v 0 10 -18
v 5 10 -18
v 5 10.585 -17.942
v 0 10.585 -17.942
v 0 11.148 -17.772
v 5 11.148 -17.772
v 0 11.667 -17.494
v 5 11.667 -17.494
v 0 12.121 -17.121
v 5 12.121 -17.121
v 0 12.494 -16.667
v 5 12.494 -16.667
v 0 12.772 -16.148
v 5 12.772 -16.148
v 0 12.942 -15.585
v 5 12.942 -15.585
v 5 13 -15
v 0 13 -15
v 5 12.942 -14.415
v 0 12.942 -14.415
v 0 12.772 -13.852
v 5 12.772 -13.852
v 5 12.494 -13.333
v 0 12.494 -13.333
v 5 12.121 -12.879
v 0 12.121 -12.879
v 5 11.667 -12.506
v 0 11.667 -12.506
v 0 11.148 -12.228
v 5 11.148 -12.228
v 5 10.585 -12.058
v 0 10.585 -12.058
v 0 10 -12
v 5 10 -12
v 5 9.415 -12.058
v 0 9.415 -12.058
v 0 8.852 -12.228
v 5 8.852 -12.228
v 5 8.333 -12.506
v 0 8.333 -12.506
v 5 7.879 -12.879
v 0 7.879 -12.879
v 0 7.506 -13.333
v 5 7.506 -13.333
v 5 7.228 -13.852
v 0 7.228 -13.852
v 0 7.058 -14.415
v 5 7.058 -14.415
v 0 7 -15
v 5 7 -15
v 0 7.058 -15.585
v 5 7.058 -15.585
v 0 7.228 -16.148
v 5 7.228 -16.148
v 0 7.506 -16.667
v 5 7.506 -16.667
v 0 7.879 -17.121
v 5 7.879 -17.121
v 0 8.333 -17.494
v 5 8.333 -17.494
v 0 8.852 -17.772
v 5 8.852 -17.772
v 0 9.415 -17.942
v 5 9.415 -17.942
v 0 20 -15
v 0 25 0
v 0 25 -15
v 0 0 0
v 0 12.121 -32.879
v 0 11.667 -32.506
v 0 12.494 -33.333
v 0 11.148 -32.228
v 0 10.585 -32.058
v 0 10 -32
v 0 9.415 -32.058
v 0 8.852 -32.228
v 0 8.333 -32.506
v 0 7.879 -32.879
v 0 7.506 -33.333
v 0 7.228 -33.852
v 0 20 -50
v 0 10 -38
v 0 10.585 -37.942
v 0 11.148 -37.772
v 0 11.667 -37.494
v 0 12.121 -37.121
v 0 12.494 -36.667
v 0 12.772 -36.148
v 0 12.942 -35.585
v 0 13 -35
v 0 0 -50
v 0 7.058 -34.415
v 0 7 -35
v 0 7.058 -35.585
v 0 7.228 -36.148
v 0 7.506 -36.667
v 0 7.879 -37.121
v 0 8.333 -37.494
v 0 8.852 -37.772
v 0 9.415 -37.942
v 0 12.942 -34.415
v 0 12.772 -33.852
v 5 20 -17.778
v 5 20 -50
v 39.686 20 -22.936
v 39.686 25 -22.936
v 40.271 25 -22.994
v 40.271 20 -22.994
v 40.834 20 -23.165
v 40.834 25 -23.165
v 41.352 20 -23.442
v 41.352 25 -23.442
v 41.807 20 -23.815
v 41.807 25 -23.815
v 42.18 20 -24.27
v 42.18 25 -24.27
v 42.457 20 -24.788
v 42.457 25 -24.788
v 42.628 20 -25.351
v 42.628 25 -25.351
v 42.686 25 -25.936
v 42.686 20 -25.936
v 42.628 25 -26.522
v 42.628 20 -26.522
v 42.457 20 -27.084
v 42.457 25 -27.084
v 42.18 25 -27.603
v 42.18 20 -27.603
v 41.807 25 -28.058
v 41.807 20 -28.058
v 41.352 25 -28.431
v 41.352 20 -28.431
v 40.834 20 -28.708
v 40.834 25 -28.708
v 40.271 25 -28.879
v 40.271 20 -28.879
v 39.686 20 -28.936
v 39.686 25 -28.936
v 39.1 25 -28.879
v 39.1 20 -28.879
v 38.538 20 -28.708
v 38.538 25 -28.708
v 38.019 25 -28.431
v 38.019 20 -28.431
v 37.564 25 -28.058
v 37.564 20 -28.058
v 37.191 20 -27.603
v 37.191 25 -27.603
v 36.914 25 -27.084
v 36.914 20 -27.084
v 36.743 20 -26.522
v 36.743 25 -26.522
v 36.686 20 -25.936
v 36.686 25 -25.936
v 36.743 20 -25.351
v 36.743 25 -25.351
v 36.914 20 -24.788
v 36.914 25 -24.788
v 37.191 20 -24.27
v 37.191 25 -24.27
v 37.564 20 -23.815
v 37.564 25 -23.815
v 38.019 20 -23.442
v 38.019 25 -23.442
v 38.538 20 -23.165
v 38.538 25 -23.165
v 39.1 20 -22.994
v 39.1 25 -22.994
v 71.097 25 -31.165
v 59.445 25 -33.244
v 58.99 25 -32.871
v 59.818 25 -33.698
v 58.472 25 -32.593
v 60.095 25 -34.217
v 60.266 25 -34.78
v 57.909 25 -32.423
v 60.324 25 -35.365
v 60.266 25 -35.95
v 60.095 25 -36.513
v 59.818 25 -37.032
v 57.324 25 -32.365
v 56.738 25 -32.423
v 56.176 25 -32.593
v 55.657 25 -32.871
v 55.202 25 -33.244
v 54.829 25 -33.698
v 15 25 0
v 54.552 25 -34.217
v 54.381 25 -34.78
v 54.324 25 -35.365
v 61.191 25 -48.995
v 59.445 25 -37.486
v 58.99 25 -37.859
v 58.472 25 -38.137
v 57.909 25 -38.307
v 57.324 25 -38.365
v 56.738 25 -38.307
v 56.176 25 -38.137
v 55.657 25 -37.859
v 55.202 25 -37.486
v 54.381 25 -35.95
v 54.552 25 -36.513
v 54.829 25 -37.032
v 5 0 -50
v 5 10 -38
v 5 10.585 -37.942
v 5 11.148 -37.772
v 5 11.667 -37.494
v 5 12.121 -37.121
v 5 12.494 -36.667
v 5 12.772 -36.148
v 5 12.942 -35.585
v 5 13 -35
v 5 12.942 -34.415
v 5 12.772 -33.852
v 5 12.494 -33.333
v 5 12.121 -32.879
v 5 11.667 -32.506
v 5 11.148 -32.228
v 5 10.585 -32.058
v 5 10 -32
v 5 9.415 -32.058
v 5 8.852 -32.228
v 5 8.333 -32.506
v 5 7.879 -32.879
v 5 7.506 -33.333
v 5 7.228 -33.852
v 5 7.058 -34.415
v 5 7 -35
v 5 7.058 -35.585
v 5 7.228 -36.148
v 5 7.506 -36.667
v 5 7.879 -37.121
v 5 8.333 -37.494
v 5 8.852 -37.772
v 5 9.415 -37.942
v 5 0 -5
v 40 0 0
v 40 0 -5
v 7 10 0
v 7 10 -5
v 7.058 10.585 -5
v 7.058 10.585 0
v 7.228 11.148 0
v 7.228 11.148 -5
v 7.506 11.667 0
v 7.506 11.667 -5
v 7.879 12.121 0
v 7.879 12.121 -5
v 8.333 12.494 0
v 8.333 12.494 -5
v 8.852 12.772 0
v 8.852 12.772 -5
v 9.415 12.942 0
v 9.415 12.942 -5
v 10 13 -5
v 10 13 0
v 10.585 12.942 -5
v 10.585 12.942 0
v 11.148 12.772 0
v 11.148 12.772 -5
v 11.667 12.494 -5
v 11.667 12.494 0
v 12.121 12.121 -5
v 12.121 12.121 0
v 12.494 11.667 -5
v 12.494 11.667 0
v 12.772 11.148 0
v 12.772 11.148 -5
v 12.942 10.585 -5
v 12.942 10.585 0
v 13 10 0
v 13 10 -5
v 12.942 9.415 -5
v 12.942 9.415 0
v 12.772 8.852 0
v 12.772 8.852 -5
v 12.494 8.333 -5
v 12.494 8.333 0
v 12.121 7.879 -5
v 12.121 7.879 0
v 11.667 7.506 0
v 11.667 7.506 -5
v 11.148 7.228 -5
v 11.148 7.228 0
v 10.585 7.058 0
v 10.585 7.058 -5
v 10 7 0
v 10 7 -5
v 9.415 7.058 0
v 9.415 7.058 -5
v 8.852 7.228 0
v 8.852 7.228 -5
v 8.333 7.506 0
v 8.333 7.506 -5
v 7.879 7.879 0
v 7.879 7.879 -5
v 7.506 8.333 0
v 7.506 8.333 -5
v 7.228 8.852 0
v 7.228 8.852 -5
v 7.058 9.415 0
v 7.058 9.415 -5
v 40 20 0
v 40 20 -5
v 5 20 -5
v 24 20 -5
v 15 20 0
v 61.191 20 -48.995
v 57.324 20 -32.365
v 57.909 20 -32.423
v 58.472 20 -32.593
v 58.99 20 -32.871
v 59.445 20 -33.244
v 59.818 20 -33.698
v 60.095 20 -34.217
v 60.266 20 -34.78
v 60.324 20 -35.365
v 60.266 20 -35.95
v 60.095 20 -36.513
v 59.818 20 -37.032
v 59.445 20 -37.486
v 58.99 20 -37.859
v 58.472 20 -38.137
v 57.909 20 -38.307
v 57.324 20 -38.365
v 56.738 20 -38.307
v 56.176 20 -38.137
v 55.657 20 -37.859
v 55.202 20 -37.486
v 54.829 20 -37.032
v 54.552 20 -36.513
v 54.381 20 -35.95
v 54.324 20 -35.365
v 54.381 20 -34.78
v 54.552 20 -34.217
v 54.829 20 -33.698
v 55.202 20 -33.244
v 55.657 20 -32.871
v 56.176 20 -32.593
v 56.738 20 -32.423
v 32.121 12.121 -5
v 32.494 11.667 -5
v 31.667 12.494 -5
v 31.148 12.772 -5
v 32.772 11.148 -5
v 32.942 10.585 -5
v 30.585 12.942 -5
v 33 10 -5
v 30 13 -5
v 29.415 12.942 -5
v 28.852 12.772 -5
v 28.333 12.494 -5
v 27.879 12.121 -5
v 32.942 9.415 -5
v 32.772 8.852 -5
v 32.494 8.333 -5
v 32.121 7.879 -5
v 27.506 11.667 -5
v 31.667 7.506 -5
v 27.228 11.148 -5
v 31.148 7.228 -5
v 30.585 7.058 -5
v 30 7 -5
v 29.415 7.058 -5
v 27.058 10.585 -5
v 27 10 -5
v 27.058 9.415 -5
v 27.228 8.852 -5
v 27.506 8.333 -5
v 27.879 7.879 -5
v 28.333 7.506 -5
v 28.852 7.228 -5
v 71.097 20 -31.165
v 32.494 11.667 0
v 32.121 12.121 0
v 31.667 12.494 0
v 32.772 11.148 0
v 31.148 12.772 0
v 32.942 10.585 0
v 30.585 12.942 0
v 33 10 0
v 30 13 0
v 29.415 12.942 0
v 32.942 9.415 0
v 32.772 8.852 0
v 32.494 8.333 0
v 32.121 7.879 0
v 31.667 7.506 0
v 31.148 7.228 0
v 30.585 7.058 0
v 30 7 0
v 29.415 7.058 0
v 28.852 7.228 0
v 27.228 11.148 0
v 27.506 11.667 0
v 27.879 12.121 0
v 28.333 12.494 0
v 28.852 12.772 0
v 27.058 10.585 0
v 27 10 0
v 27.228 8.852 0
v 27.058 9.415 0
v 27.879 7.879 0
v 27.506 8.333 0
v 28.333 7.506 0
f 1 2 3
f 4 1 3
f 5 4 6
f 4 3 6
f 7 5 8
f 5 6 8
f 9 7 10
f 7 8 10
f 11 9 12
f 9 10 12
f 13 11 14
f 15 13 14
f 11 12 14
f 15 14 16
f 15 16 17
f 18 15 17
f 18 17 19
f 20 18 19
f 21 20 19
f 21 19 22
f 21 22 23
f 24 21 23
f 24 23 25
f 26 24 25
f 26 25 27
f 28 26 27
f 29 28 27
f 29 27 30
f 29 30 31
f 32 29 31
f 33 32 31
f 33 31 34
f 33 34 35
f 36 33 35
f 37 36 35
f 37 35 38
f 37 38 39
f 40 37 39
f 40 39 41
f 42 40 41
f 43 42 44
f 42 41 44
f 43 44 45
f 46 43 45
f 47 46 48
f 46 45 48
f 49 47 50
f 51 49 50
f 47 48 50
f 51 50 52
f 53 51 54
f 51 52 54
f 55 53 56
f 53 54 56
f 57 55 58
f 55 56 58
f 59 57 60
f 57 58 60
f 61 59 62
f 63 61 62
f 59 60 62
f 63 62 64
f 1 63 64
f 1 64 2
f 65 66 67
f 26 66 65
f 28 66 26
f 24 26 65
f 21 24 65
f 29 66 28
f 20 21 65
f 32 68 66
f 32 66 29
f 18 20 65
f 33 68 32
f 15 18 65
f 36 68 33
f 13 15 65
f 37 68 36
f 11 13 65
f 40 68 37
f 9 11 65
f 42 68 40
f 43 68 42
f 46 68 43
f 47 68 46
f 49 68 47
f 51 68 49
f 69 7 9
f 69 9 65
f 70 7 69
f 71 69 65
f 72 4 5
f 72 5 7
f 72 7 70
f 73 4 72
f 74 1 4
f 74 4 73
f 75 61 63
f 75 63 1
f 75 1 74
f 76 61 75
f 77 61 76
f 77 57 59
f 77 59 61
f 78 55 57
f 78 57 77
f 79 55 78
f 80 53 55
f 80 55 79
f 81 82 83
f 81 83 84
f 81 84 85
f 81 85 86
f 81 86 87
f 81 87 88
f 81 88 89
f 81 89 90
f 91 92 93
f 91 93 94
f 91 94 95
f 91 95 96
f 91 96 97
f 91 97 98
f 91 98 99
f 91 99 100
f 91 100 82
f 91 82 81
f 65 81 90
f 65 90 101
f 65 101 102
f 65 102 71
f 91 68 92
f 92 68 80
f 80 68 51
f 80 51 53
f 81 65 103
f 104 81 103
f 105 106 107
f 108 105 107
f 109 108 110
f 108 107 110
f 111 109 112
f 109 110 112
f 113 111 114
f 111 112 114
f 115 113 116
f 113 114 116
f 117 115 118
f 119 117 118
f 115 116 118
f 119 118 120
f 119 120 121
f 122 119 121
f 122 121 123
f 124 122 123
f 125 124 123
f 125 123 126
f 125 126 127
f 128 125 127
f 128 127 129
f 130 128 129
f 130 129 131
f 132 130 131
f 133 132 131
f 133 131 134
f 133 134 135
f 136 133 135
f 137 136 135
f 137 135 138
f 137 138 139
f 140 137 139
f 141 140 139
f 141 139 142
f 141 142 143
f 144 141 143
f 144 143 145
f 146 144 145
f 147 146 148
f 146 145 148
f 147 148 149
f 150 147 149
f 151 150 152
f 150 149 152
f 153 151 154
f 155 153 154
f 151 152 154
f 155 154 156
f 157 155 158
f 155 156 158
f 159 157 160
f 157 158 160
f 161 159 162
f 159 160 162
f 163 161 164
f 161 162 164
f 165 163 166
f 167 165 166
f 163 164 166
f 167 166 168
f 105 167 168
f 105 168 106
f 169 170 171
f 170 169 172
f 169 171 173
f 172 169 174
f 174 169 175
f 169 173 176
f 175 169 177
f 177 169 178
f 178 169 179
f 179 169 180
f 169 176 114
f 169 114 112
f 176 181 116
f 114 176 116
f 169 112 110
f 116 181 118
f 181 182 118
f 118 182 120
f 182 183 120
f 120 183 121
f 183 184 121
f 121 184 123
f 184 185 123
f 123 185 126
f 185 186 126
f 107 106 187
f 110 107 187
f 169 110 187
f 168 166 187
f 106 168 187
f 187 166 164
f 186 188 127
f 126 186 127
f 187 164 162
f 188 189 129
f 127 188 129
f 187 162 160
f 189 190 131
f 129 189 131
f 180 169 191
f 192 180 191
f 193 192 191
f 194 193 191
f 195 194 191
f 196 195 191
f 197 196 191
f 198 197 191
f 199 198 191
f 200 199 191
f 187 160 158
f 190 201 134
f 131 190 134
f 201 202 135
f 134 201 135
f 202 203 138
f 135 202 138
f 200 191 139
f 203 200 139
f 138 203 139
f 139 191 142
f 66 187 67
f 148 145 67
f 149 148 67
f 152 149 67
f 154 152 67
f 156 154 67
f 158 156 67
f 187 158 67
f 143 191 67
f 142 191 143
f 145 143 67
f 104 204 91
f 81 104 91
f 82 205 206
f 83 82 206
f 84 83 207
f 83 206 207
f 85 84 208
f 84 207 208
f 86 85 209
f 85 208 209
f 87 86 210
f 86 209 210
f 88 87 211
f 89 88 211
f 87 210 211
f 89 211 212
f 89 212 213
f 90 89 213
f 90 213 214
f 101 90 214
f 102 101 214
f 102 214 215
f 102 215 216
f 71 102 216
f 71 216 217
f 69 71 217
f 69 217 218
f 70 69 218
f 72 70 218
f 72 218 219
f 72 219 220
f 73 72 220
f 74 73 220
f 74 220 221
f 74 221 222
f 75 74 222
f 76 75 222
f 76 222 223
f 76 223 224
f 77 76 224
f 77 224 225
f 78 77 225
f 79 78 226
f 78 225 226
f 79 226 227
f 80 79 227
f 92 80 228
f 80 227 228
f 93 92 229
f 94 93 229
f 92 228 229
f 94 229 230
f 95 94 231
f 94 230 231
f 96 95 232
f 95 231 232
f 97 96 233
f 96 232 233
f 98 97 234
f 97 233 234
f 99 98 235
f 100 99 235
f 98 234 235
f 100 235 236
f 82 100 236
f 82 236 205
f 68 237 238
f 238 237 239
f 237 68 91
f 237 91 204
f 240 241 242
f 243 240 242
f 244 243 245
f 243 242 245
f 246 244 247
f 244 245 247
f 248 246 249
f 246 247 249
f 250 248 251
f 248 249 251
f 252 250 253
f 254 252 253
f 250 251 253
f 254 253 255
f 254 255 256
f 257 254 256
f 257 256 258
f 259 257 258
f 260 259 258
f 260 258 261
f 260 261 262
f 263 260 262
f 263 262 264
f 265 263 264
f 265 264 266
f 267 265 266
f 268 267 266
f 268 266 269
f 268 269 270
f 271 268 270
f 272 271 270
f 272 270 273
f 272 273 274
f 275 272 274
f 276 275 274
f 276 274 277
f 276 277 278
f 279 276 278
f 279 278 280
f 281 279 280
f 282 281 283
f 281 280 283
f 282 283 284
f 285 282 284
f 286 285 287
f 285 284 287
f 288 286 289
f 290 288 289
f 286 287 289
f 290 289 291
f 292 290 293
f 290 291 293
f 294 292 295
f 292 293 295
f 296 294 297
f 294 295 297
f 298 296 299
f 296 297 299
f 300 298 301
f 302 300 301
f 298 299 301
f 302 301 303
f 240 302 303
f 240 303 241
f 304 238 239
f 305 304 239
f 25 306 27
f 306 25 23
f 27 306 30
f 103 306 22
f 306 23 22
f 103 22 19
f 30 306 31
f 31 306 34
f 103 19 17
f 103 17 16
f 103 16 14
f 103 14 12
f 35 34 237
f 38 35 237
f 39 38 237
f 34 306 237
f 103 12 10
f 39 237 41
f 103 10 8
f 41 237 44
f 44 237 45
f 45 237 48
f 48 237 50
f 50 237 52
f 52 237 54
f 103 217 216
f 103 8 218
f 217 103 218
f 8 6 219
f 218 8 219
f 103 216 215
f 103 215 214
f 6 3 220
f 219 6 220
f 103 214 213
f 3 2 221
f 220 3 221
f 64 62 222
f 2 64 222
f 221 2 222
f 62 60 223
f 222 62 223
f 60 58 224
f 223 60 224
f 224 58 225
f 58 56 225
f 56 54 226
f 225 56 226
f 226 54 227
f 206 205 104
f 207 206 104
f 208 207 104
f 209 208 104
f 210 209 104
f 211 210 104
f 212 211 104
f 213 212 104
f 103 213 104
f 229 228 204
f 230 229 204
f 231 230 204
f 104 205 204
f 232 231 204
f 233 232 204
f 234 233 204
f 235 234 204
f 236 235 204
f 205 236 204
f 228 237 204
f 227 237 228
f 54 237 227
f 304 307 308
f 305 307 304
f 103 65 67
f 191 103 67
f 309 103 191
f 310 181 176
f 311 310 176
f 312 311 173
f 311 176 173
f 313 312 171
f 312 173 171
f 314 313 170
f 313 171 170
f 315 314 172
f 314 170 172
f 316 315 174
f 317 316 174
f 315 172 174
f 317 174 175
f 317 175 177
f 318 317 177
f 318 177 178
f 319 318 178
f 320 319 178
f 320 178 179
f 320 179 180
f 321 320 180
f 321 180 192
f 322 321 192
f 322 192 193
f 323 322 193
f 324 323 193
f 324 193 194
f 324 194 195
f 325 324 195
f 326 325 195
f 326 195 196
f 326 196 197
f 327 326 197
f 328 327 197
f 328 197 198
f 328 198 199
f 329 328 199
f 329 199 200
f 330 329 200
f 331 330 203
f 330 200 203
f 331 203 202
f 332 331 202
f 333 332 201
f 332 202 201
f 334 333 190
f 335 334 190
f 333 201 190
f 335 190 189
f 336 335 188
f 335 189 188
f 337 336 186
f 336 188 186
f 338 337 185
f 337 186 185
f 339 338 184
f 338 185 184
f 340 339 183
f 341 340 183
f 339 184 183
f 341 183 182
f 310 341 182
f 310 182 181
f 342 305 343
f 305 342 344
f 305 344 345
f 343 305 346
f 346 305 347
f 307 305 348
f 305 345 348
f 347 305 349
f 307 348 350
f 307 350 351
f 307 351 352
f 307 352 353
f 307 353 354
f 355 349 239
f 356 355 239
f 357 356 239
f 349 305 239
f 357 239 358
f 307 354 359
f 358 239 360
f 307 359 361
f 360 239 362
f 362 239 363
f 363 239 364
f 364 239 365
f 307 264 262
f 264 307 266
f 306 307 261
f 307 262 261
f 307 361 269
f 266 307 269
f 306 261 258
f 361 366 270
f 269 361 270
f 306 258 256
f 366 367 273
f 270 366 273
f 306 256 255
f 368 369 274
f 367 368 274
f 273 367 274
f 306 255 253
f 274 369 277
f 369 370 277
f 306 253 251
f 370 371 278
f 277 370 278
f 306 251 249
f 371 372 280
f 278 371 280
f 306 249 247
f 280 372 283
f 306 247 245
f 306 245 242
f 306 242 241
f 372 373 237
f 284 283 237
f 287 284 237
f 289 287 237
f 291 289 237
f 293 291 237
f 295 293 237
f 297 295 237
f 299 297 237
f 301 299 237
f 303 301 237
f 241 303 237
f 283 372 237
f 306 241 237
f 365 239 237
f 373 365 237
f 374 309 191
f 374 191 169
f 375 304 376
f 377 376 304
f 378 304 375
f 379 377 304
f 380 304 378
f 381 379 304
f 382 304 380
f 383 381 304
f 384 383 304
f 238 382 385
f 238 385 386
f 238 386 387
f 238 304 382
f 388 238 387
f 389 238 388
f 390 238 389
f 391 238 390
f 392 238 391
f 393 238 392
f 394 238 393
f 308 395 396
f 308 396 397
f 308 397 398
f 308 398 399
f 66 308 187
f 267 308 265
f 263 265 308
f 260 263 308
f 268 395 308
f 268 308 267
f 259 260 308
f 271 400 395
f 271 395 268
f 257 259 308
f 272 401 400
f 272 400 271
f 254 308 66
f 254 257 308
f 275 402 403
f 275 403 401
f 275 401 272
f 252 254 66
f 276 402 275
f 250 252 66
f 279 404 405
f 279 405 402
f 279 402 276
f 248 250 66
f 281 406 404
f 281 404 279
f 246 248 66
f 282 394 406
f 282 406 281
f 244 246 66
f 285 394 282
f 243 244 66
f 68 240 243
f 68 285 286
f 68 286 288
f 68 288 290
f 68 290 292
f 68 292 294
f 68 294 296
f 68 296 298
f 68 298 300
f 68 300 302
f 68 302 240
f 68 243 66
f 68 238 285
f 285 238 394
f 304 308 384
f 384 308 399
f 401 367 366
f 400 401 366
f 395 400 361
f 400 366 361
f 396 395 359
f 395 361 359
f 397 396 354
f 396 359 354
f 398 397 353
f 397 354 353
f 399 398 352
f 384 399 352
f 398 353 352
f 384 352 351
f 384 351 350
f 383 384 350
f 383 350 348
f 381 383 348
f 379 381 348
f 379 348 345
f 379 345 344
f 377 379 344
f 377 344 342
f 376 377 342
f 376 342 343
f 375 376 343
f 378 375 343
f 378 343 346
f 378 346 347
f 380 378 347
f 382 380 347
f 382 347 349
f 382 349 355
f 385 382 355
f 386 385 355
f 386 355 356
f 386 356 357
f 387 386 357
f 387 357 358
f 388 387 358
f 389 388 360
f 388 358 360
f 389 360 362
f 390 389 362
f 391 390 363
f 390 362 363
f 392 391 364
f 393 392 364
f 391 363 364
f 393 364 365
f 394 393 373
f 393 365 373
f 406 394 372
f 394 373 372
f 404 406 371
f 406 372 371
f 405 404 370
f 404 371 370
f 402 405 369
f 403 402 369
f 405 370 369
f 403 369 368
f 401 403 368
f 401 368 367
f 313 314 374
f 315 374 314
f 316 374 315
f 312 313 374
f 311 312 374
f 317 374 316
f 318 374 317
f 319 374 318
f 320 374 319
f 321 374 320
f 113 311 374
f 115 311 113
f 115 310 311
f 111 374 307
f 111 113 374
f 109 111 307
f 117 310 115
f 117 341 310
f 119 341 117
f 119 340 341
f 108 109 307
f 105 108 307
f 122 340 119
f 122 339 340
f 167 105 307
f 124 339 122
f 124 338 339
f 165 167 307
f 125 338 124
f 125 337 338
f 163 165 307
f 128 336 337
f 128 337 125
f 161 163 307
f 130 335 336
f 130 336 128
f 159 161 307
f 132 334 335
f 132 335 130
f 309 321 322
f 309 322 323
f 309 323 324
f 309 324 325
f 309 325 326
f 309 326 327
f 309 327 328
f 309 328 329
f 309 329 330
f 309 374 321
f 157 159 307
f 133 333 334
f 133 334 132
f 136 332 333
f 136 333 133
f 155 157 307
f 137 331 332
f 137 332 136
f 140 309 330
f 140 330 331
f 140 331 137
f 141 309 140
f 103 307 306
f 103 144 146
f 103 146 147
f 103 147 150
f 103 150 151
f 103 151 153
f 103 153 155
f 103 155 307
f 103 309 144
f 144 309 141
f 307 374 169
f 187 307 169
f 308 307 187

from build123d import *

# Parameters (mm, degrees)
BOSS_EXTRUDE1_DEPTH = 20
BOSS_EXTRUDE5_DEPTH = 5
SKETCH12_R          = 3
CUT_EXTRUDE7_DEPTH  = 88.776628115
SKETCH13_R          = 3
CUT_EXTRUDE8_DEPTH  = 87.566562518
SKETCH14_R          = 3
CUT_EXTRUDE9_DEPTH  = 91.441895398


with BuildPart() as part:
    # Sketch1 → Boss-Extrude1 (new body)
    with BuildSketch(Plane(origin=(0, 0, 0), x_dir=(1, 0, 0), z_dir=(0, 1, 0))):
        Polygon((0, 50), (0, 0), (40, 0), (40, 5), (5, 5), (5, 50), align=None)
    extrude(amount=BOSS_EXTRUDE1_DEPTH)

    # Sketch11 → Boss-Extrude5 (add)
    with BuildSketch(Plane(origin=(0, 20, 0), x_dir=(1, 0, 0), z_dir=(0, 1, 0))):
        Polygon((0, 0), (0, 15), (61.191009328, 48.995005183), (71.096669706, 31.164816504), (15, 0), align=None)
    extrude(amount=BOSS_EXTRUDE5_DEPTH)

    # Sketch12 → Cut-Extrude7 (cut, through all)
    with BuildSketch(Plane(origin=(0, 0, -5), x_dir=(-1, 0, 0), z_dir=(0, 0, -1))):
        with Locations((-10, 10)):
            Circle(SKETCH12_R)
        with Locations((-30, 10)):
            Circle(SKETCH12_R)
    extrude(amount=-CUT_EXTRUDE7_DEPTH, mode=Mode.SUBTRACT)

    # Sketch13 → Cut-Extrude8 (cut, through all)
    with BuildSketch(Plane(origin=(5, 0, 0), x_dir=(0, 0, -1), z_dir=(1, 0, 0))):
        with Locations((15, 10)):
            Circle(SKETCH13_R)
        with Locations((35, 10)):
            Circle(SKETCH13_R)
    extrude(amount=-CUT_EXTRUDE8_DEPTH, mode=Mode.SUBTRACT)

    # Sketch14 → Cut-Extrude9 (cut, through all)
    with BuildSketch(Plane(origin=(0, 25, 0), x_dir=(1, 0, 0), z_dir=(0, 1, 0))):
        with Locations((57.323641314, 35.365007327)):
            Circle(SKETCH14_R)
        with Locations((39.685556362, 25.936435896)):
            Circle(SKETCH14_R)
    extrude(amount=-CUT_EXTRUDE9_DEPTH, mode=Mode.SUBTRACT)


solid = part.part
